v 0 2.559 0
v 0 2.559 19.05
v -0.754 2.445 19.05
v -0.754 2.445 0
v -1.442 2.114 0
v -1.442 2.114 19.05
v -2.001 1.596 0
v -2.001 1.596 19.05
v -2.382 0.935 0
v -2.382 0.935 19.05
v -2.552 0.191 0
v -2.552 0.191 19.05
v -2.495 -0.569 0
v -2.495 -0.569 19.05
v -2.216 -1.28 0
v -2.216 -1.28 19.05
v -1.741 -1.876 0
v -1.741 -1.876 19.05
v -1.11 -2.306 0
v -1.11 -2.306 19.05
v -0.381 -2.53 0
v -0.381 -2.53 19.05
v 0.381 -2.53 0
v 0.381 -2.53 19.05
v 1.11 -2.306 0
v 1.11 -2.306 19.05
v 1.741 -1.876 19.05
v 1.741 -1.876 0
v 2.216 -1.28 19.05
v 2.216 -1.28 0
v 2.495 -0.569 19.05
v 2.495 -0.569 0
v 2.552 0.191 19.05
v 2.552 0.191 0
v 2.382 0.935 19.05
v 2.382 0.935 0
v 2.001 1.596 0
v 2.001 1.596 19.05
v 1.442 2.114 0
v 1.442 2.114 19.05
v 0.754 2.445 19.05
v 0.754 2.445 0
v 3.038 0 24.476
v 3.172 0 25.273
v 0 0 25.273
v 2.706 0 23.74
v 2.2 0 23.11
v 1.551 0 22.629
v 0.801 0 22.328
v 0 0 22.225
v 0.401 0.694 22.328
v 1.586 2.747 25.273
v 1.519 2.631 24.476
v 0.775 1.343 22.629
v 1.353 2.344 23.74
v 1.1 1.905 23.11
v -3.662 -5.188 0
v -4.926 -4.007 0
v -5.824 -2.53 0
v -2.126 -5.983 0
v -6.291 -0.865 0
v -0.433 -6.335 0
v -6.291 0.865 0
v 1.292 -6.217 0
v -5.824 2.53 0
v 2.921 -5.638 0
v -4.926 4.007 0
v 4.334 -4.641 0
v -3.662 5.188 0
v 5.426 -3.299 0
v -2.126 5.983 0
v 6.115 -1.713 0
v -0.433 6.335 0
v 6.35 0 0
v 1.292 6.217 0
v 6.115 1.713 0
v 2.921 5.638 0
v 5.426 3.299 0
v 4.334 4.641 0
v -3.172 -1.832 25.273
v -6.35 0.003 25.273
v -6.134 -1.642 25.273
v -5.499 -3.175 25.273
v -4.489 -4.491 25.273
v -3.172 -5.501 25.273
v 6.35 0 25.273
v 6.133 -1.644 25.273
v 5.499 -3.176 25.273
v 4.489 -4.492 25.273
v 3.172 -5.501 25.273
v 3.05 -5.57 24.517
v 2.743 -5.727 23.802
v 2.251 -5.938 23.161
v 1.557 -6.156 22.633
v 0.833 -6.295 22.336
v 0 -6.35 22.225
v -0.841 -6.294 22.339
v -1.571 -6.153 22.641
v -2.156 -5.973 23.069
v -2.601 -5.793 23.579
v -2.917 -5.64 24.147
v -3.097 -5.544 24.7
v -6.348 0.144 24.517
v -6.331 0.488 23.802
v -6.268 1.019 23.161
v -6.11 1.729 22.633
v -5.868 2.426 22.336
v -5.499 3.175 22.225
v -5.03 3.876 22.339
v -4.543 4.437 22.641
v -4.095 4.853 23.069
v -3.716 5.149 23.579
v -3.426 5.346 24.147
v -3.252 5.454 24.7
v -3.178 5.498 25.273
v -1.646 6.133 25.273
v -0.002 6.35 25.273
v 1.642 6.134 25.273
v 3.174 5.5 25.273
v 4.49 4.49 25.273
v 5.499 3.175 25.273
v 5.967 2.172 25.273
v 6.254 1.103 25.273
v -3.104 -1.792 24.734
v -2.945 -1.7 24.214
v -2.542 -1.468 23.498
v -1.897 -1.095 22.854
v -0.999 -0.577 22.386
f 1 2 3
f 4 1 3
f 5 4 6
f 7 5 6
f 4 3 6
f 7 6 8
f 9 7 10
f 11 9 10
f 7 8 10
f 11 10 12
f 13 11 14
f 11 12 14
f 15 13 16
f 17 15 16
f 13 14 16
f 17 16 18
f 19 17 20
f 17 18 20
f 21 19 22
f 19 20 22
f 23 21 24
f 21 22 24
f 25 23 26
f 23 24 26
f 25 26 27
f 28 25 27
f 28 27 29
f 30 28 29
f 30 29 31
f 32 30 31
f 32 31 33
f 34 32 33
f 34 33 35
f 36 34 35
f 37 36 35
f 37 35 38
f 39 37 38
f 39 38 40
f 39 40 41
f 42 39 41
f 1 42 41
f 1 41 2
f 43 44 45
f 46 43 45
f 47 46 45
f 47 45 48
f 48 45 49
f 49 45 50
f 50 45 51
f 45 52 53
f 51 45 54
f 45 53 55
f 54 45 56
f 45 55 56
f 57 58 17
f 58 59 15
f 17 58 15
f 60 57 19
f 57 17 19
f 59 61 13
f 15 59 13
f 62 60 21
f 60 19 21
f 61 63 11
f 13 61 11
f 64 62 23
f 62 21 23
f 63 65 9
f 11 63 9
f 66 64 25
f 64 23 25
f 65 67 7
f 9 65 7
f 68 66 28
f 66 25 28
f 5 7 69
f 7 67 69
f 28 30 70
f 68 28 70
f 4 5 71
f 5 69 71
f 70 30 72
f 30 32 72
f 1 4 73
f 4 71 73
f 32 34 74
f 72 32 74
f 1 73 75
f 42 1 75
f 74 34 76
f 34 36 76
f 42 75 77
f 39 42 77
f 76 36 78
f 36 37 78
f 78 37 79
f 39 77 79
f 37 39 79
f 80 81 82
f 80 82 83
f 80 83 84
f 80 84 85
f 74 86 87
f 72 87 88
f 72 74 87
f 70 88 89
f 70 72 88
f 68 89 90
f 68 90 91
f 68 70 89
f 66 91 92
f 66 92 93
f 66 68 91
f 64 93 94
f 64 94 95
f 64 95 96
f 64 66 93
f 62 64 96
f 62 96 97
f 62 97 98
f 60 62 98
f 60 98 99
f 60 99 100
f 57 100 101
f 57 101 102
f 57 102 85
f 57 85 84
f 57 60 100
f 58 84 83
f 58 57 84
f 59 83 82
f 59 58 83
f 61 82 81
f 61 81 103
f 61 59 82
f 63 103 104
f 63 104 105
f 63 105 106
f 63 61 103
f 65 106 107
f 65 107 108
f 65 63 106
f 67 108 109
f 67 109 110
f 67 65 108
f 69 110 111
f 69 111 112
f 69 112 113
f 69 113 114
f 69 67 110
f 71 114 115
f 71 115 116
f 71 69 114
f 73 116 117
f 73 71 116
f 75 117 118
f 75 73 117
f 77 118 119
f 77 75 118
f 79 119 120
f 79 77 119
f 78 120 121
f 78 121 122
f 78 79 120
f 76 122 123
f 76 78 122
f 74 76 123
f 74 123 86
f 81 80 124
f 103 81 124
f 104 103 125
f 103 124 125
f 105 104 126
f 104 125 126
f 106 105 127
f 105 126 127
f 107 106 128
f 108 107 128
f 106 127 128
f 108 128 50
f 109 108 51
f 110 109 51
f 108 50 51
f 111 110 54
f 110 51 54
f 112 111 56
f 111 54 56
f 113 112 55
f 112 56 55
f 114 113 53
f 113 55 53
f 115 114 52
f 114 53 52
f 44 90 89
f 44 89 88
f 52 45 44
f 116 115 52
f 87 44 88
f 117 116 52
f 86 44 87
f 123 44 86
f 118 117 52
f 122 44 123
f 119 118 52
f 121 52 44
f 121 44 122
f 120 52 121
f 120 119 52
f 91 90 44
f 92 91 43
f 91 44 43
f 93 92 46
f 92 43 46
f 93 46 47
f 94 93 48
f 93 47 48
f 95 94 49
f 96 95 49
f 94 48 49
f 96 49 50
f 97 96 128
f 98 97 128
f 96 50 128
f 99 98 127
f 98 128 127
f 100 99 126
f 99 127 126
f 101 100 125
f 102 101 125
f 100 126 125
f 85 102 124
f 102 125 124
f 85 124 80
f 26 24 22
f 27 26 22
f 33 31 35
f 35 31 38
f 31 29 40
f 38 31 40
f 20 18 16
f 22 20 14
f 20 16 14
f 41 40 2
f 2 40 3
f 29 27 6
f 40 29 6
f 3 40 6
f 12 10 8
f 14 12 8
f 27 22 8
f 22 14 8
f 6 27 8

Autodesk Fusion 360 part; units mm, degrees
sketch "Sketch1" plane through (0, 0, 0) normal (0, 0, 1) x (1, 0, 0)
  circle A0 centre (0, 0) radius 6.35
  dimension "d1" = 12.7
extrude "Extrude1" add sketch "Sketch1" along normal blind 25.4
ref_plane "WorkPlane1" through (0, -6.35, 16.0163) normal (0, -1, 0) x (-1, 0, 0)
sketch "Sketch2" plane through (0, -6.35, 16.0163) normal (0, -1, 0) x (1, 0, 0)
  line L0 (6.35, 9.3837) -> (-6.35, 9.3837)
  line L1 (6.35, -16.0163) -> (-6.35, -16.0163)
  point P0 (0, 9.3837)
ref_plane "WorkPlane2" through (0, 0, 22.225) normal (0, 0, 1) x (1, 0, 0)
sketch "Sketch4" plane through (0, 0, 22.225) normal (0, 0, 1) x (1, 0, 0)
  circle A0 centre (0, 0) radius 6.35
  line L0 (0, 0) -> (0, -6.35) construction
  line L1 (0, 0) -> (5.4993, 3.175) construction
  line L2 (0, 0) -> (-5.4993, 3.175) construction
  dimension "d22" = 360
hole "Hole1" at (0, -6.35, 25.4) direction (0, 1, 0) diameter 6.35 depth 6.35 tip angle 180
pattern_circular "C-Pattern1" count 3 over 360 about axis through (0, 0, 0) along (0, 0, 1) of "Hole1"
extrude "Extrude2" cut sketch "Sketch4" against normal blind 0.127 from surface at 3.175
hole "Hole2" at (0, 0, 0) direction (0, 0, 1) diameter 2.2708 depth 12.573 tip angle 180
hole "Hole3" at (0, 0, 0) direction (0, 0, 1) diameter 5.1181 depth 19.05 tip angle 180
equation "d5 = d1 / 2"
